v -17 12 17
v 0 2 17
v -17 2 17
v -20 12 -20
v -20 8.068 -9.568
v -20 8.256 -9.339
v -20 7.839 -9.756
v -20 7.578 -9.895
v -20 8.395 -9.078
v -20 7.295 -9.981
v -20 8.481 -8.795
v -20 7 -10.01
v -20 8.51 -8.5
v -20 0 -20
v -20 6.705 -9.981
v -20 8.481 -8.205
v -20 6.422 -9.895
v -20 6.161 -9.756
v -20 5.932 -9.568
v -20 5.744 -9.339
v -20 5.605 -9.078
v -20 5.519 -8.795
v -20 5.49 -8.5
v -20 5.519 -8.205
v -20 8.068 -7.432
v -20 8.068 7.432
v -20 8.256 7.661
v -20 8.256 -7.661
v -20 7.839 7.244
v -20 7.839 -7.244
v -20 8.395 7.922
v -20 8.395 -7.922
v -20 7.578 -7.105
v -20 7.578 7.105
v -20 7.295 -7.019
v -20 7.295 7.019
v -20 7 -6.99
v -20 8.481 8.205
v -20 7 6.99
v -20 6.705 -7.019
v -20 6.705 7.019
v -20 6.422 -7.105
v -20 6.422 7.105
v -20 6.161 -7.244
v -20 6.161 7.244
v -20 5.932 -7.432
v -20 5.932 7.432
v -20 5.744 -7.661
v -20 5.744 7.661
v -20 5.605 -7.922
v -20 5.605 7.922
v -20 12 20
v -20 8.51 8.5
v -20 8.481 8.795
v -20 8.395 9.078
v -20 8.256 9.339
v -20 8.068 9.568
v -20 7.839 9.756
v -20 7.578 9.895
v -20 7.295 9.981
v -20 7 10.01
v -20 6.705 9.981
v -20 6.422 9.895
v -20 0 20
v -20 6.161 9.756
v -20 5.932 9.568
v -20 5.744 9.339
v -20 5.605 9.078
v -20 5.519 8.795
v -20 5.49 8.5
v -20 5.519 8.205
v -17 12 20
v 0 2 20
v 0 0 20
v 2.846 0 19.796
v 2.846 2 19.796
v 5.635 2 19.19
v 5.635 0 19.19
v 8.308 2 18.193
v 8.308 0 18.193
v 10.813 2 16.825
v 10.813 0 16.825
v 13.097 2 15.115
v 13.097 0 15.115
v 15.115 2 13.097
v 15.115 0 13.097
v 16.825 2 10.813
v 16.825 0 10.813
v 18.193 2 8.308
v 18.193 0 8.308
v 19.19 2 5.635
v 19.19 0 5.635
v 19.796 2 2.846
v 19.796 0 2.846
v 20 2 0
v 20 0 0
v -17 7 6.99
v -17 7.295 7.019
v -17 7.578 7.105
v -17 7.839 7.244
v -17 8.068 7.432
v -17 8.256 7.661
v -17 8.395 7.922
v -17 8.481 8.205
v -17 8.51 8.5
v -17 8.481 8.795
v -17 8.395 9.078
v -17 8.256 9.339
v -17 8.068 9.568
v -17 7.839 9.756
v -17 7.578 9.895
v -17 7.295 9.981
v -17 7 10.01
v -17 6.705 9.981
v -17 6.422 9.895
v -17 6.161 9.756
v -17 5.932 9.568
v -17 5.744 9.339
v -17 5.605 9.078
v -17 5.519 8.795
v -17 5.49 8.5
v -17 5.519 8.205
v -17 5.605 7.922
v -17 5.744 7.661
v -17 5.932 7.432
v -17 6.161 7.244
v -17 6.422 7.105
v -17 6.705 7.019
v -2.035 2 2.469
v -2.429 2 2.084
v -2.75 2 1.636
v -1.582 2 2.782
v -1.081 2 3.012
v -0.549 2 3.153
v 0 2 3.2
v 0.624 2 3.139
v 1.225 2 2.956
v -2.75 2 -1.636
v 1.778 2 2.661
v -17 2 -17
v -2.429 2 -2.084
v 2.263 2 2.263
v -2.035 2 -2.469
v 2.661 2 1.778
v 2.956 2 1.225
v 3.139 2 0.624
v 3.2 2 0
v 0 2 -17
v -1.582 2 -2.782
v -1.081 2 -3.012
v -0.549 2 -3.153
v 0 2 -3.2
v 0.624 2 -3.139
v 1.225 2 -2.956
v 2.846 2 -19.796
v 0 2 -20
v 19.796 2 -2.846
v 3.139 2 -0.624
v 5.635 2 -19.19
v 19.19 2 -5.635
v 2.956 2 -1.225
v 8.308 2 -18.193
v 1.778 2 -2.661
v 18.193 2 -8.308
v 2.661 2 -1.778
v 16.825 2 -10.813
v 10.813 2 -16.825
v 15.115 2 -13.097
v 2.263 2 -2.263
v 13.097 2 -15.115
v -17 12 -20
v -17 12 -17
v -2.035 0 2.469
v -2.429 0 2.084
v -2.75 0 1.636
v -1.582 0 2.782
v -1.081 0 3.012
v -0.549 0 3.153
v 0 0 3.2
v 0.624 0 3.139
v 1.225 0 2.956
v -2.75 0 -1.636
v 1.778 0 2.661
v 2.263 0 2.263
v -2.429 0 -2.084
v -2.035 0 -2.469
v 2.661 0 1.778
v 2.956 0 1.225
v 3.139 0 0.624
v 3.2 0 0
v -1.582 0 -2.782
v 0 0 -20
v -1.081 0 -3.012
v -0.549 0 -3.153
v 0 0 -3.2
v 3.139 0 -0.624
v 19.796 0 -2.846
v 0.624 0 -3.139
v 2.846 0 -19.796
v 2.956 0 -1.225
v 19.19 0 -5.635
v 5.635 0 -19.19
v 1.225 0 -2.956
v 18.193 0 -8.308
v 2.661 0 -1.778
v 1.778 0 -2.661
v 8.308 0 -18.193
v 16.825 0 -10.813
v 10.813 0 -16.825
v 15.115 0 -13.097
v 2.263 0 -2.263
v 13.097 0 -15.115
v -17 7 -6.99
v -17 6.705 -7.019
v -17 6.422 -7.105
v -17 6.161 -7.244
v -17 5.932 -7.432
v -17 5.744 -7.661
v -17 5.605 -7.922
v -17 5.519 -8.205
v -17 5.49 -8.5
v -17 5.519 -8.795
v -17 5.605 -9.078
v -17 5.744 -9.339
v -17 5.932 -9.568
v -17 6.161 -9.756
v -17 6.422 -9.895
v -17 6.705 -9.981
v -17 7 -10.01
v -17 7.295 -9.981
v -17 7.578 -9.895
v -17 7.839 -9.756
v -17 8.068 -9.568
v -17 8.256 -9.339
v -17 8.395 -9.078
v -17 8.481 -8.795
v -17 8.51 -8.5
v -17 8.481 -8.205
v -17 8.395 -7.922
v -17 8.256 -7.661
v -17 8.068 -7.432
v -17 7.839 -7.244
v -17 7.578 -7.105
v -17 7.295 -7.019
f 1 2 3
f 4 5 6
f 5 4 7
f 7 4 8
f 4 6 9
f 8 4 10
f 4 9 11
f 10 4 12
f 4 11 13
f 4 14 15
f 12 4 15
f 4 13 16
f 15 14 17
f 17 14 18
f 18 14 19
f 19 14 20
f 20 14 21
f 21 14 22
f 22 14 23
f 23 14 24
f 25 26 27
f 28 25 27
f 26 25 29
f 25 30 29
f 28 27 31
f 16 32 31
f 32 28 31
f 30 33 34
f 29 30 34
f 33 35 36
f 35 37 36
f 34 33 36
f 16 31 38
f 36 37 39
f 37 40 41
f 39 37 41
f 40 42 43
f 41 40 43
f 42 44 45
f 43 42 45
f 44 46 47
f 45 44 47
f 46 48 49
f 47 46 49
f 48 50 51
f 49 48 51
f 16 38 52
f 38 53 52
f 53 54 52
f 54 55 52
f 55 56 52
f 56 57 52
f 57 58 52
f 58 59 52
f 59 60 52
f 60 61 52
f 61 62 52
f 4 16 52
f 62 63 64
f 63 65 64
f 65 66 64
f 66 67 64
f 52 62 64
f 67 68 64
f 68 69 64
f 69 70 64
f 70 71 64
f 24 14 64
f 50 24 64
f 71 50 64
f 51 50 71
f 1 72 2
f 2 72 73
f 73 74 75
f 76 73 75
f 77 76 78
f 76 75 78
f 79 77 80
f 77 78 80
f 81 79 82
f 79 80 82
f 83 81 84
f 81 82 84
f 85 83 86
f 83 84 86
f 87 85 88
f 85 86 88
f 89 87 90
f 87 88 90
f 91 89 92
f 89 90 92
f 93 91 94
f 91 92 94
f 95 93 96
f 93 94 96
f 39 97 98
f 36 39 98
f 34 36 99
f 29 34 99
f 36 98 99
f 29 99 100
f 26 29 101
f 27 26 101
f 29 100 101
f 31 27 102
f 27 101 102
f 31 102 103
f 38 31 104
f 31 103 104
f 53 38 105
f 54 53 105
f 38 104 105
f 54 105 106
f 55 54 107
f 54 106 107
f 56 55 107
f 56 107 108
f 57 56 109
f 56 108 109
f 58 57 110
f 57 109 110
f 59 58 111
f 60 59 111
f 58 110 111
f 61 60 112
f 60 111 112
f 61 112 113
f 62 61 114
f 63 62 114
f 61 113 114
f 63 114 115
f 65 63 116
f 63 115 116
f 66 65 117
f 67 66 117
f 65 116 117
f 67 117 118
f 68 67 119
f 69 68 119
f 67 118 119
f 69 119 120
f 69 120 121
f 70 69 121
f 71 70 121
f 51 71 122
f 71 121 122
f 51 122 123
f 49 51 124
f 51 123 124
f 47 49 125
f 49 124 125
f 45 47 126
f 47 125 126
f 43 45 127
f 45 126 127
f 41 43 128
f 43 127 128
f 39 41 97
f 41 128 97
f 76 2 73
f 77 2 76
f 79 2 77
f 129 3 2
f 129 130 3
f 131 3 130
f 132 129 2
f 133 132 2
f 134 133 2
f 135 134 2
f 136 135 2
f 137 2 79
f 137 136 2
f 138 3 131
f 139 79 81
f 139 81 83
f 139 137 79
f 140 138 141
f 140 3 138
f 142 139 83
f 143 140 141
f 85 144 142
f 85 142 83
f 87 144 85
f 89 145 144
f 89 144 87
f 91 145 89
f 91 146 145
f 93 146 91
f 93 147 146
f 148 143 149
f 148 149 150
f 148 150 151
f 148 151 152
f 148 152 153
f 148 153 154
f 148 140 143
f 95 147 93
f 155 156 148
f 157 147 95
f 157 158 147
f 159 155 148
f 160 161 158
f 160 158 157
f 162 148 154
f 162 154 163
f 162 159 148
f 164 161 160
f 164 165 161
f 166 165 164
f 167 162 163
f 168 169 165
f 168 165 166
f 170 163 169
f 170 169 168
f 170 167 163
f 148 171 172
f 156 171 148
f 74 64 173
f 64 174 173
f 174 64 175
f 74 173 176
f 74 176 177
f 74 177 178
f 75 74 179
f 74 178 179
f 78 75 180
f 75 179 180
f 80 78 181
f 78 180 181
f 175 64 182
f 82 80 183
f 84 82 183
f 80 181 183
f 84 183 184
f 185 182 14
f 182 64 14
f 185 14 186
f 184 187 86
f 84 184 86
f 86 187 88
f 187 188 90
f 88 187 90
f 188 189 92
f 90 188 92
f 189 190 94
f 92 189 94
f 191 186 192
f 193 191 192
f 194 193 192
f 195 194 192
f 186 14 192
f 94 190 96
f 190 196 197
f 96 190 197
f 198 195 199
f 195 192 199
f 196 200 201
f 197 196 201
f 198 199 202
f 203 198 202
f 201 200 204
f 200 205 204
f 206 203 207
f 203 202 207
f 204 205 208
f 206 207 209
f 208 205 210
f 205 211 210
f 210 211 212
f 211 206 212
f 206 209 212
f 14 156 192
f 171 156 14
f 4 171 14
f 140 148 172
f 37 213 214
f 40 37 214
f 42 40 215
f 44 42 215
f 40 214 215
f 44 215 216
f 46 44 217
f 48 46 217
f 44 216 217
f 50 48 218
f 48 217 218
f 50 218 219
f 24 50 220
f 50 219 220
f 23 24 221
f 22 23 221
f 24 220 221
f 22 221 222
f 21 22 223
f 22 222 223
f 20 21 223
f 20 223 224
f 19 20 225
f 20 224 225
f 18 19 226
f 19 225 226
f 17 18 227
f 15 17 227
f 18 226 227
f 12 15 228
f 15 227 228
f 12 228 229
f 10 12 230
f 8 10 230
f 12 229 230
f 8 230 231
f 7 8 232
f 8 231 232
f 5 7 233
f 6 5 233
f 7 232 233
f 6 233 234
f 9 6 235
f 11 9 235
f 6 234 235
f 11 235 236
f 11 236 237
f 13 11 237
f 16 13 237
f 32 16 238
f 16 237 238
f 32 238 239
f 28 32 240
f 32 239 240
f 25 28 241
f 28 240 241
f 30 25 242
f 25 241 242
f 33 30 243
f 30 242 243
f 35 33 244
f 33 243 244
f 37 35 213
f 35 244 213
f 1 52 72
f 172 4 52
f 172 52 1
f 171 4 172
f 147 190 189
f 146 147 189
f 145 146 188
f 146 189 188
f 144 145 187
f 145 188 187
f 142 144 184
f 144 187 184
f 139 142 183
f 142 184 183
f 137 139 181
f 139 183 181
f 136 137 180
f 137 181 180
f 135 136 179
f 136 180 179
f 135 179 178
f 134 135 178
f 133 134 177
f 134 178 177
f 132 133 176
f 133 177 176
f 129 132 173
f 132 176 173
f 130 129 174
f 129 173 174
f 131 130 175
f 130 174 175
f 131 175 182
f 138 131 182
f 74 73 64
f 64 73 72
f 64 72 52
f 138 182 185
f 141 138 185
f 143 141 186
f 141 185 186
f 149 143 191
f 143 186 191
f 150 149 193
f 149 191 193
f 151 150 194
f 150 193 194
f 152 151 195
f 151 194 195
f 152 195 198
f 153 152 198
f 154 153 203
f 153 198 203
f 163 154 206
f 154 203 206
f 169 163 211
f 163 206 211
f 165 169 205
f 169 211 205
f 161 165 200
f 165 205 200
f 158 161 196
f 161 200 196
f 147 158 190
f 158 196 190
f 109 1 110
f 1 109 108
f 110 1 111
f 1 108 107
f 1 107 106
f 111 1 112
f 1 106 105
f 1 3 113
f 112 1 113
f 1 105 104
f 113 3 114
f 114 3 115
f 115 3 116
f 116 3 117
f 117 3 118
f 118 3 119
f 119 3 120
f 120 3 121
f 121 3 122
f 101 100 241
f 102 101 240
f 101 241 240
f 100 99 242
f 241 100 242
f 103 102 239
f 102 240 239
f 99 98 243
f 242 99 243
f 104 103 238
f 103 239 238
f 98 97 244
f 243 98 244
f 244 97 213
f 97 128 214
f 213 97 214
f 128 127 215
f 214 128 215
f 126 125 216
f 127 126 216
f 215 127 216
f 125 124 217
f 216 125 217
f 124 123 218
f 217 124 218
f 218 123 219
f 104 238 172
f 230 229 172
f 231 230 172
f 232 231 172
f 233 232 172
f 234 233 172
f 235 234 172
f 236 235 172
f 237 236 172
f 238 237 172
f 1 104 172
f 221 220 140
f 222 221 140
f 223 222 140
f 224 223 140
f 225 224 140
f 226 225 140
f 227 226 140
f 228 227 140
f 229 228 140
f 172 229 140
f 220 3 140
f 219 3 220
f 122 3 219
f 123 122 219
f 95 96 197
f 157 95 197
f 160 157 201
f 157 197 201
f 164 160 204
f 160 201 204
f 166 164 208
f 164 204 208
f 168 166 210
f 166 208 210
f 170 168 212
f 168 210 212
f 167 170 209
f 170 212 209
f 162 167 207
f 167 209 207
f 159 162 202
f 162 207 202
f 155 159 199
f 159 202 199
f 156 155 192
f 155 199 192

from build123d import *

# Parameters (mm, degrees)
BOSS_EXTRUDE1_DEPTH = 2
BOSS_EXTRUDE2_DEPTH = 12
BOSS_EXTRUDE3_DEPTH = 3
BOSS_EXTRUDE4_DEPTH = 3
BOSS_EXTRUDE5_START = -2
BOSS_EXTRUDE5_DEPTH = 2
CUT_EXTRUDE1_DEPTH  = 3


with BuildPart() as part:
    # Sketch1 → Boss-Extrude1 (new body)
    with BuildSketch(Plane(origin=(0, 0, 0), x_dir=(1, 0, 0), z_dir=(0, 1, 0))):
        with BuildLine():
            ThreePointArc((0, -3.2), (-3.2, 0), (0, 3.2))
            Line((0, 3.2), (0, 20))
            ThreePointArc((0, 20), (-9.728487163, 17.474453855), (-17, 10.535653753))
            Line((-17, 10.535653753), (-17, -10.535653753))
            ThreePointArc((-17, -10.535653753), (-9.728487163, -17.474453855), (0, -20))
            Line((0, -20), (0, -3.2))
        make_face()
        with BuildLine():
            Line((0, 20), (0, 3.2))
            ThreePointArc((0, 3.2), (2.2627417, 2.2627417), (3.2, 0))
            ThreePointArc((3.2, 0), (2.2627417, -2.2627417), (0, -3.2))
            Line((0, -3.2), (0, -20))
            ThreePointArc((0, -20), (14.142135624, -14.142135624), (20, 0))
            ThreePointArc((20, 0), (14.142135624, 14.142135624), (0, 20))
        make_face()
        with BuildLine():
            Line((-17, -20), (0, -20))
            ThreePointArc((0, -20), (-9.728487163, -17.474453855), (-17, -10.535653753))
            Line((-17, -10.535653753), (-17, -20))
        make_face()
        with BuildLine():
            Line((-20, -20), (-17, -20))
            Line((-17, -20), (-17, -10.535653753))
            ThreePointArc((-17, -10.535653753), (-19.235384062, -5.477225575), (-20, 0))
            Line((-20, 0), (-20, -20))
        make_face()
        with BuildLine():
            Line((-17, -10.535653753), (-17, 10.535653753))
            ThreePointArc((-17, 10.535653753), (-19.235384062, 5.477225575), (-20, 0))
            ThreePointArc((-20, 0), (-19.235384062, -5.477225575), (-17, -10.535653753))
        make_face()
        with BuildLine():
            Line((-17, 10.535653753), (-17, 20))
            Line((-17, 20), (-20, 20))
            Line((-20, 20), (-20, 0))
            ThreePointArc((-20, 0), (-19.235384062, 5.477225575), (-17, 10.535653753))
        make_face()
        with BuildLine():
            ThreePointArc((-17, 10.535653753), (-9.728487163, 17.474453855), (0, 20))
            Line((0, 20), (-17, 20))
            Line((-17, 20), (-17, 10.535653753))
        make_face()
    extrude(amount=BOSS_EXTRUDE1_DEPTH)

    # Sketch1<4> → Boss-Extrude2 (add)
    with BuildSketch(Plane(origin=(0, 0, 0), x_dir=(1, 0, 0), z_dir=(0, 1, 0))):
        with BuildLine():
            Line((-17, 10.535653753), (-17, 20))
            Line((-17, 20), (-20, 20))
            Line((-20, 20), (-20, 0))
            ThreePointArc((-20, 0), (-19.235384062, 5.477225575), (-17, 10.535653753))
        make_face()
        with BuildLine():
            Line((-17, -10.535653753), (-17, 10.535653753))
            ThreePointArc((-17, 10.535653753), (-19.235384062, 5.477225575), (-20, 0))
            ThreePointArc((-20, 0), (-19.235384062, -5.477225575), (-17, -10.535653753))
        make_face()
        with BuildLine():
            Line((-20, -20), (-17, -20))
            Line((-17, -20), (-17, -10.535653753))
            ThreePointArc((-17, -10.535653753), (-19.235384062, -5.477225575), (-20, 0))
            Line((-20, 0), (-20, -20))
        make_face()
    extrude(amount=BOSS_EXTRUDE2_DEPTH)

    # Sketch2 → Boss-Extrude3 (add)
    with BuildSketch(Plane.XY.offset(20)):
        Polygon((-17, 12), (0, 2), (-17, 2), align=None)
    extrude(amount=-BOSS_EXTRUDE3_DEPTH)

    # Sketch3 → Boss-Extrude4 (add)
    with BuildSketch(Plane(origin=(0, 0, -20), x_dir=(-1, 0, 0), z_dir=(0, 0, -1))):
        Polygon((17, 12), (0, 2), (17, 2), align=None)
    extrude(amount=-BOSS_EXTRUDE4_DEPTH)

    # Sketch4 → Boss-Extrude5 (add)
    with BuildSketch(Plane(origin=(0, 2, 0), x_dir=(1, 0, 0), z_dir=(0, 1, 0)).offset(BOSS_EXTRUDE5_START)):
        with BuildLine():
            Line((-2.75, -1.636306817), (-2.75, 0))
            Line((-2.75, 0), (-2.75, 1.636306817))
            ThreePointArc((-2.75, 1.636306817), (-3.2, 0), (-2.75, -1.636306817))
        make_face()
    extrude(amount=BOSS_EXTRUDE5_DEPTH)

    # Sketch5 → Cut-Extrude1 (cut)
    with BuildSketch(Plane(origin=(-17, 0, 0), x_dir=(0, 0, -1), z_dir=(1, 0, 0))):
        with BuildLine():
            ThreePointArc((-10.01, 7), (-8.5, 5.49), (-6.99, 7))
            Line((-6.99, 7), (-10.01, 7))
        make_face()
        with BuildLine():
            Line((-10.01, 7), (-6.99, 7))
            ThreePointArc((-6.99, 7), (-8.5, 8.51), (-10.01, 7))
        make_face()
        with BuildLine():
            ThreePointArc((10.01, 7), (8.5, 8.51), (6.99, 7))
            Line((6.99, 7), (10.01, 7))
        make_face()
        with BuildLine():
            Line((10.01, 7), (6.99, 7))
            ThreePointArc((6.99, 7), (8.5, 5.49), (10.01, 7))
        make_face()
    extrude(amount=-CUT_EXTRUDE1_DEPTH, mode=Mode.SUBTRACT)


solid = part.part
